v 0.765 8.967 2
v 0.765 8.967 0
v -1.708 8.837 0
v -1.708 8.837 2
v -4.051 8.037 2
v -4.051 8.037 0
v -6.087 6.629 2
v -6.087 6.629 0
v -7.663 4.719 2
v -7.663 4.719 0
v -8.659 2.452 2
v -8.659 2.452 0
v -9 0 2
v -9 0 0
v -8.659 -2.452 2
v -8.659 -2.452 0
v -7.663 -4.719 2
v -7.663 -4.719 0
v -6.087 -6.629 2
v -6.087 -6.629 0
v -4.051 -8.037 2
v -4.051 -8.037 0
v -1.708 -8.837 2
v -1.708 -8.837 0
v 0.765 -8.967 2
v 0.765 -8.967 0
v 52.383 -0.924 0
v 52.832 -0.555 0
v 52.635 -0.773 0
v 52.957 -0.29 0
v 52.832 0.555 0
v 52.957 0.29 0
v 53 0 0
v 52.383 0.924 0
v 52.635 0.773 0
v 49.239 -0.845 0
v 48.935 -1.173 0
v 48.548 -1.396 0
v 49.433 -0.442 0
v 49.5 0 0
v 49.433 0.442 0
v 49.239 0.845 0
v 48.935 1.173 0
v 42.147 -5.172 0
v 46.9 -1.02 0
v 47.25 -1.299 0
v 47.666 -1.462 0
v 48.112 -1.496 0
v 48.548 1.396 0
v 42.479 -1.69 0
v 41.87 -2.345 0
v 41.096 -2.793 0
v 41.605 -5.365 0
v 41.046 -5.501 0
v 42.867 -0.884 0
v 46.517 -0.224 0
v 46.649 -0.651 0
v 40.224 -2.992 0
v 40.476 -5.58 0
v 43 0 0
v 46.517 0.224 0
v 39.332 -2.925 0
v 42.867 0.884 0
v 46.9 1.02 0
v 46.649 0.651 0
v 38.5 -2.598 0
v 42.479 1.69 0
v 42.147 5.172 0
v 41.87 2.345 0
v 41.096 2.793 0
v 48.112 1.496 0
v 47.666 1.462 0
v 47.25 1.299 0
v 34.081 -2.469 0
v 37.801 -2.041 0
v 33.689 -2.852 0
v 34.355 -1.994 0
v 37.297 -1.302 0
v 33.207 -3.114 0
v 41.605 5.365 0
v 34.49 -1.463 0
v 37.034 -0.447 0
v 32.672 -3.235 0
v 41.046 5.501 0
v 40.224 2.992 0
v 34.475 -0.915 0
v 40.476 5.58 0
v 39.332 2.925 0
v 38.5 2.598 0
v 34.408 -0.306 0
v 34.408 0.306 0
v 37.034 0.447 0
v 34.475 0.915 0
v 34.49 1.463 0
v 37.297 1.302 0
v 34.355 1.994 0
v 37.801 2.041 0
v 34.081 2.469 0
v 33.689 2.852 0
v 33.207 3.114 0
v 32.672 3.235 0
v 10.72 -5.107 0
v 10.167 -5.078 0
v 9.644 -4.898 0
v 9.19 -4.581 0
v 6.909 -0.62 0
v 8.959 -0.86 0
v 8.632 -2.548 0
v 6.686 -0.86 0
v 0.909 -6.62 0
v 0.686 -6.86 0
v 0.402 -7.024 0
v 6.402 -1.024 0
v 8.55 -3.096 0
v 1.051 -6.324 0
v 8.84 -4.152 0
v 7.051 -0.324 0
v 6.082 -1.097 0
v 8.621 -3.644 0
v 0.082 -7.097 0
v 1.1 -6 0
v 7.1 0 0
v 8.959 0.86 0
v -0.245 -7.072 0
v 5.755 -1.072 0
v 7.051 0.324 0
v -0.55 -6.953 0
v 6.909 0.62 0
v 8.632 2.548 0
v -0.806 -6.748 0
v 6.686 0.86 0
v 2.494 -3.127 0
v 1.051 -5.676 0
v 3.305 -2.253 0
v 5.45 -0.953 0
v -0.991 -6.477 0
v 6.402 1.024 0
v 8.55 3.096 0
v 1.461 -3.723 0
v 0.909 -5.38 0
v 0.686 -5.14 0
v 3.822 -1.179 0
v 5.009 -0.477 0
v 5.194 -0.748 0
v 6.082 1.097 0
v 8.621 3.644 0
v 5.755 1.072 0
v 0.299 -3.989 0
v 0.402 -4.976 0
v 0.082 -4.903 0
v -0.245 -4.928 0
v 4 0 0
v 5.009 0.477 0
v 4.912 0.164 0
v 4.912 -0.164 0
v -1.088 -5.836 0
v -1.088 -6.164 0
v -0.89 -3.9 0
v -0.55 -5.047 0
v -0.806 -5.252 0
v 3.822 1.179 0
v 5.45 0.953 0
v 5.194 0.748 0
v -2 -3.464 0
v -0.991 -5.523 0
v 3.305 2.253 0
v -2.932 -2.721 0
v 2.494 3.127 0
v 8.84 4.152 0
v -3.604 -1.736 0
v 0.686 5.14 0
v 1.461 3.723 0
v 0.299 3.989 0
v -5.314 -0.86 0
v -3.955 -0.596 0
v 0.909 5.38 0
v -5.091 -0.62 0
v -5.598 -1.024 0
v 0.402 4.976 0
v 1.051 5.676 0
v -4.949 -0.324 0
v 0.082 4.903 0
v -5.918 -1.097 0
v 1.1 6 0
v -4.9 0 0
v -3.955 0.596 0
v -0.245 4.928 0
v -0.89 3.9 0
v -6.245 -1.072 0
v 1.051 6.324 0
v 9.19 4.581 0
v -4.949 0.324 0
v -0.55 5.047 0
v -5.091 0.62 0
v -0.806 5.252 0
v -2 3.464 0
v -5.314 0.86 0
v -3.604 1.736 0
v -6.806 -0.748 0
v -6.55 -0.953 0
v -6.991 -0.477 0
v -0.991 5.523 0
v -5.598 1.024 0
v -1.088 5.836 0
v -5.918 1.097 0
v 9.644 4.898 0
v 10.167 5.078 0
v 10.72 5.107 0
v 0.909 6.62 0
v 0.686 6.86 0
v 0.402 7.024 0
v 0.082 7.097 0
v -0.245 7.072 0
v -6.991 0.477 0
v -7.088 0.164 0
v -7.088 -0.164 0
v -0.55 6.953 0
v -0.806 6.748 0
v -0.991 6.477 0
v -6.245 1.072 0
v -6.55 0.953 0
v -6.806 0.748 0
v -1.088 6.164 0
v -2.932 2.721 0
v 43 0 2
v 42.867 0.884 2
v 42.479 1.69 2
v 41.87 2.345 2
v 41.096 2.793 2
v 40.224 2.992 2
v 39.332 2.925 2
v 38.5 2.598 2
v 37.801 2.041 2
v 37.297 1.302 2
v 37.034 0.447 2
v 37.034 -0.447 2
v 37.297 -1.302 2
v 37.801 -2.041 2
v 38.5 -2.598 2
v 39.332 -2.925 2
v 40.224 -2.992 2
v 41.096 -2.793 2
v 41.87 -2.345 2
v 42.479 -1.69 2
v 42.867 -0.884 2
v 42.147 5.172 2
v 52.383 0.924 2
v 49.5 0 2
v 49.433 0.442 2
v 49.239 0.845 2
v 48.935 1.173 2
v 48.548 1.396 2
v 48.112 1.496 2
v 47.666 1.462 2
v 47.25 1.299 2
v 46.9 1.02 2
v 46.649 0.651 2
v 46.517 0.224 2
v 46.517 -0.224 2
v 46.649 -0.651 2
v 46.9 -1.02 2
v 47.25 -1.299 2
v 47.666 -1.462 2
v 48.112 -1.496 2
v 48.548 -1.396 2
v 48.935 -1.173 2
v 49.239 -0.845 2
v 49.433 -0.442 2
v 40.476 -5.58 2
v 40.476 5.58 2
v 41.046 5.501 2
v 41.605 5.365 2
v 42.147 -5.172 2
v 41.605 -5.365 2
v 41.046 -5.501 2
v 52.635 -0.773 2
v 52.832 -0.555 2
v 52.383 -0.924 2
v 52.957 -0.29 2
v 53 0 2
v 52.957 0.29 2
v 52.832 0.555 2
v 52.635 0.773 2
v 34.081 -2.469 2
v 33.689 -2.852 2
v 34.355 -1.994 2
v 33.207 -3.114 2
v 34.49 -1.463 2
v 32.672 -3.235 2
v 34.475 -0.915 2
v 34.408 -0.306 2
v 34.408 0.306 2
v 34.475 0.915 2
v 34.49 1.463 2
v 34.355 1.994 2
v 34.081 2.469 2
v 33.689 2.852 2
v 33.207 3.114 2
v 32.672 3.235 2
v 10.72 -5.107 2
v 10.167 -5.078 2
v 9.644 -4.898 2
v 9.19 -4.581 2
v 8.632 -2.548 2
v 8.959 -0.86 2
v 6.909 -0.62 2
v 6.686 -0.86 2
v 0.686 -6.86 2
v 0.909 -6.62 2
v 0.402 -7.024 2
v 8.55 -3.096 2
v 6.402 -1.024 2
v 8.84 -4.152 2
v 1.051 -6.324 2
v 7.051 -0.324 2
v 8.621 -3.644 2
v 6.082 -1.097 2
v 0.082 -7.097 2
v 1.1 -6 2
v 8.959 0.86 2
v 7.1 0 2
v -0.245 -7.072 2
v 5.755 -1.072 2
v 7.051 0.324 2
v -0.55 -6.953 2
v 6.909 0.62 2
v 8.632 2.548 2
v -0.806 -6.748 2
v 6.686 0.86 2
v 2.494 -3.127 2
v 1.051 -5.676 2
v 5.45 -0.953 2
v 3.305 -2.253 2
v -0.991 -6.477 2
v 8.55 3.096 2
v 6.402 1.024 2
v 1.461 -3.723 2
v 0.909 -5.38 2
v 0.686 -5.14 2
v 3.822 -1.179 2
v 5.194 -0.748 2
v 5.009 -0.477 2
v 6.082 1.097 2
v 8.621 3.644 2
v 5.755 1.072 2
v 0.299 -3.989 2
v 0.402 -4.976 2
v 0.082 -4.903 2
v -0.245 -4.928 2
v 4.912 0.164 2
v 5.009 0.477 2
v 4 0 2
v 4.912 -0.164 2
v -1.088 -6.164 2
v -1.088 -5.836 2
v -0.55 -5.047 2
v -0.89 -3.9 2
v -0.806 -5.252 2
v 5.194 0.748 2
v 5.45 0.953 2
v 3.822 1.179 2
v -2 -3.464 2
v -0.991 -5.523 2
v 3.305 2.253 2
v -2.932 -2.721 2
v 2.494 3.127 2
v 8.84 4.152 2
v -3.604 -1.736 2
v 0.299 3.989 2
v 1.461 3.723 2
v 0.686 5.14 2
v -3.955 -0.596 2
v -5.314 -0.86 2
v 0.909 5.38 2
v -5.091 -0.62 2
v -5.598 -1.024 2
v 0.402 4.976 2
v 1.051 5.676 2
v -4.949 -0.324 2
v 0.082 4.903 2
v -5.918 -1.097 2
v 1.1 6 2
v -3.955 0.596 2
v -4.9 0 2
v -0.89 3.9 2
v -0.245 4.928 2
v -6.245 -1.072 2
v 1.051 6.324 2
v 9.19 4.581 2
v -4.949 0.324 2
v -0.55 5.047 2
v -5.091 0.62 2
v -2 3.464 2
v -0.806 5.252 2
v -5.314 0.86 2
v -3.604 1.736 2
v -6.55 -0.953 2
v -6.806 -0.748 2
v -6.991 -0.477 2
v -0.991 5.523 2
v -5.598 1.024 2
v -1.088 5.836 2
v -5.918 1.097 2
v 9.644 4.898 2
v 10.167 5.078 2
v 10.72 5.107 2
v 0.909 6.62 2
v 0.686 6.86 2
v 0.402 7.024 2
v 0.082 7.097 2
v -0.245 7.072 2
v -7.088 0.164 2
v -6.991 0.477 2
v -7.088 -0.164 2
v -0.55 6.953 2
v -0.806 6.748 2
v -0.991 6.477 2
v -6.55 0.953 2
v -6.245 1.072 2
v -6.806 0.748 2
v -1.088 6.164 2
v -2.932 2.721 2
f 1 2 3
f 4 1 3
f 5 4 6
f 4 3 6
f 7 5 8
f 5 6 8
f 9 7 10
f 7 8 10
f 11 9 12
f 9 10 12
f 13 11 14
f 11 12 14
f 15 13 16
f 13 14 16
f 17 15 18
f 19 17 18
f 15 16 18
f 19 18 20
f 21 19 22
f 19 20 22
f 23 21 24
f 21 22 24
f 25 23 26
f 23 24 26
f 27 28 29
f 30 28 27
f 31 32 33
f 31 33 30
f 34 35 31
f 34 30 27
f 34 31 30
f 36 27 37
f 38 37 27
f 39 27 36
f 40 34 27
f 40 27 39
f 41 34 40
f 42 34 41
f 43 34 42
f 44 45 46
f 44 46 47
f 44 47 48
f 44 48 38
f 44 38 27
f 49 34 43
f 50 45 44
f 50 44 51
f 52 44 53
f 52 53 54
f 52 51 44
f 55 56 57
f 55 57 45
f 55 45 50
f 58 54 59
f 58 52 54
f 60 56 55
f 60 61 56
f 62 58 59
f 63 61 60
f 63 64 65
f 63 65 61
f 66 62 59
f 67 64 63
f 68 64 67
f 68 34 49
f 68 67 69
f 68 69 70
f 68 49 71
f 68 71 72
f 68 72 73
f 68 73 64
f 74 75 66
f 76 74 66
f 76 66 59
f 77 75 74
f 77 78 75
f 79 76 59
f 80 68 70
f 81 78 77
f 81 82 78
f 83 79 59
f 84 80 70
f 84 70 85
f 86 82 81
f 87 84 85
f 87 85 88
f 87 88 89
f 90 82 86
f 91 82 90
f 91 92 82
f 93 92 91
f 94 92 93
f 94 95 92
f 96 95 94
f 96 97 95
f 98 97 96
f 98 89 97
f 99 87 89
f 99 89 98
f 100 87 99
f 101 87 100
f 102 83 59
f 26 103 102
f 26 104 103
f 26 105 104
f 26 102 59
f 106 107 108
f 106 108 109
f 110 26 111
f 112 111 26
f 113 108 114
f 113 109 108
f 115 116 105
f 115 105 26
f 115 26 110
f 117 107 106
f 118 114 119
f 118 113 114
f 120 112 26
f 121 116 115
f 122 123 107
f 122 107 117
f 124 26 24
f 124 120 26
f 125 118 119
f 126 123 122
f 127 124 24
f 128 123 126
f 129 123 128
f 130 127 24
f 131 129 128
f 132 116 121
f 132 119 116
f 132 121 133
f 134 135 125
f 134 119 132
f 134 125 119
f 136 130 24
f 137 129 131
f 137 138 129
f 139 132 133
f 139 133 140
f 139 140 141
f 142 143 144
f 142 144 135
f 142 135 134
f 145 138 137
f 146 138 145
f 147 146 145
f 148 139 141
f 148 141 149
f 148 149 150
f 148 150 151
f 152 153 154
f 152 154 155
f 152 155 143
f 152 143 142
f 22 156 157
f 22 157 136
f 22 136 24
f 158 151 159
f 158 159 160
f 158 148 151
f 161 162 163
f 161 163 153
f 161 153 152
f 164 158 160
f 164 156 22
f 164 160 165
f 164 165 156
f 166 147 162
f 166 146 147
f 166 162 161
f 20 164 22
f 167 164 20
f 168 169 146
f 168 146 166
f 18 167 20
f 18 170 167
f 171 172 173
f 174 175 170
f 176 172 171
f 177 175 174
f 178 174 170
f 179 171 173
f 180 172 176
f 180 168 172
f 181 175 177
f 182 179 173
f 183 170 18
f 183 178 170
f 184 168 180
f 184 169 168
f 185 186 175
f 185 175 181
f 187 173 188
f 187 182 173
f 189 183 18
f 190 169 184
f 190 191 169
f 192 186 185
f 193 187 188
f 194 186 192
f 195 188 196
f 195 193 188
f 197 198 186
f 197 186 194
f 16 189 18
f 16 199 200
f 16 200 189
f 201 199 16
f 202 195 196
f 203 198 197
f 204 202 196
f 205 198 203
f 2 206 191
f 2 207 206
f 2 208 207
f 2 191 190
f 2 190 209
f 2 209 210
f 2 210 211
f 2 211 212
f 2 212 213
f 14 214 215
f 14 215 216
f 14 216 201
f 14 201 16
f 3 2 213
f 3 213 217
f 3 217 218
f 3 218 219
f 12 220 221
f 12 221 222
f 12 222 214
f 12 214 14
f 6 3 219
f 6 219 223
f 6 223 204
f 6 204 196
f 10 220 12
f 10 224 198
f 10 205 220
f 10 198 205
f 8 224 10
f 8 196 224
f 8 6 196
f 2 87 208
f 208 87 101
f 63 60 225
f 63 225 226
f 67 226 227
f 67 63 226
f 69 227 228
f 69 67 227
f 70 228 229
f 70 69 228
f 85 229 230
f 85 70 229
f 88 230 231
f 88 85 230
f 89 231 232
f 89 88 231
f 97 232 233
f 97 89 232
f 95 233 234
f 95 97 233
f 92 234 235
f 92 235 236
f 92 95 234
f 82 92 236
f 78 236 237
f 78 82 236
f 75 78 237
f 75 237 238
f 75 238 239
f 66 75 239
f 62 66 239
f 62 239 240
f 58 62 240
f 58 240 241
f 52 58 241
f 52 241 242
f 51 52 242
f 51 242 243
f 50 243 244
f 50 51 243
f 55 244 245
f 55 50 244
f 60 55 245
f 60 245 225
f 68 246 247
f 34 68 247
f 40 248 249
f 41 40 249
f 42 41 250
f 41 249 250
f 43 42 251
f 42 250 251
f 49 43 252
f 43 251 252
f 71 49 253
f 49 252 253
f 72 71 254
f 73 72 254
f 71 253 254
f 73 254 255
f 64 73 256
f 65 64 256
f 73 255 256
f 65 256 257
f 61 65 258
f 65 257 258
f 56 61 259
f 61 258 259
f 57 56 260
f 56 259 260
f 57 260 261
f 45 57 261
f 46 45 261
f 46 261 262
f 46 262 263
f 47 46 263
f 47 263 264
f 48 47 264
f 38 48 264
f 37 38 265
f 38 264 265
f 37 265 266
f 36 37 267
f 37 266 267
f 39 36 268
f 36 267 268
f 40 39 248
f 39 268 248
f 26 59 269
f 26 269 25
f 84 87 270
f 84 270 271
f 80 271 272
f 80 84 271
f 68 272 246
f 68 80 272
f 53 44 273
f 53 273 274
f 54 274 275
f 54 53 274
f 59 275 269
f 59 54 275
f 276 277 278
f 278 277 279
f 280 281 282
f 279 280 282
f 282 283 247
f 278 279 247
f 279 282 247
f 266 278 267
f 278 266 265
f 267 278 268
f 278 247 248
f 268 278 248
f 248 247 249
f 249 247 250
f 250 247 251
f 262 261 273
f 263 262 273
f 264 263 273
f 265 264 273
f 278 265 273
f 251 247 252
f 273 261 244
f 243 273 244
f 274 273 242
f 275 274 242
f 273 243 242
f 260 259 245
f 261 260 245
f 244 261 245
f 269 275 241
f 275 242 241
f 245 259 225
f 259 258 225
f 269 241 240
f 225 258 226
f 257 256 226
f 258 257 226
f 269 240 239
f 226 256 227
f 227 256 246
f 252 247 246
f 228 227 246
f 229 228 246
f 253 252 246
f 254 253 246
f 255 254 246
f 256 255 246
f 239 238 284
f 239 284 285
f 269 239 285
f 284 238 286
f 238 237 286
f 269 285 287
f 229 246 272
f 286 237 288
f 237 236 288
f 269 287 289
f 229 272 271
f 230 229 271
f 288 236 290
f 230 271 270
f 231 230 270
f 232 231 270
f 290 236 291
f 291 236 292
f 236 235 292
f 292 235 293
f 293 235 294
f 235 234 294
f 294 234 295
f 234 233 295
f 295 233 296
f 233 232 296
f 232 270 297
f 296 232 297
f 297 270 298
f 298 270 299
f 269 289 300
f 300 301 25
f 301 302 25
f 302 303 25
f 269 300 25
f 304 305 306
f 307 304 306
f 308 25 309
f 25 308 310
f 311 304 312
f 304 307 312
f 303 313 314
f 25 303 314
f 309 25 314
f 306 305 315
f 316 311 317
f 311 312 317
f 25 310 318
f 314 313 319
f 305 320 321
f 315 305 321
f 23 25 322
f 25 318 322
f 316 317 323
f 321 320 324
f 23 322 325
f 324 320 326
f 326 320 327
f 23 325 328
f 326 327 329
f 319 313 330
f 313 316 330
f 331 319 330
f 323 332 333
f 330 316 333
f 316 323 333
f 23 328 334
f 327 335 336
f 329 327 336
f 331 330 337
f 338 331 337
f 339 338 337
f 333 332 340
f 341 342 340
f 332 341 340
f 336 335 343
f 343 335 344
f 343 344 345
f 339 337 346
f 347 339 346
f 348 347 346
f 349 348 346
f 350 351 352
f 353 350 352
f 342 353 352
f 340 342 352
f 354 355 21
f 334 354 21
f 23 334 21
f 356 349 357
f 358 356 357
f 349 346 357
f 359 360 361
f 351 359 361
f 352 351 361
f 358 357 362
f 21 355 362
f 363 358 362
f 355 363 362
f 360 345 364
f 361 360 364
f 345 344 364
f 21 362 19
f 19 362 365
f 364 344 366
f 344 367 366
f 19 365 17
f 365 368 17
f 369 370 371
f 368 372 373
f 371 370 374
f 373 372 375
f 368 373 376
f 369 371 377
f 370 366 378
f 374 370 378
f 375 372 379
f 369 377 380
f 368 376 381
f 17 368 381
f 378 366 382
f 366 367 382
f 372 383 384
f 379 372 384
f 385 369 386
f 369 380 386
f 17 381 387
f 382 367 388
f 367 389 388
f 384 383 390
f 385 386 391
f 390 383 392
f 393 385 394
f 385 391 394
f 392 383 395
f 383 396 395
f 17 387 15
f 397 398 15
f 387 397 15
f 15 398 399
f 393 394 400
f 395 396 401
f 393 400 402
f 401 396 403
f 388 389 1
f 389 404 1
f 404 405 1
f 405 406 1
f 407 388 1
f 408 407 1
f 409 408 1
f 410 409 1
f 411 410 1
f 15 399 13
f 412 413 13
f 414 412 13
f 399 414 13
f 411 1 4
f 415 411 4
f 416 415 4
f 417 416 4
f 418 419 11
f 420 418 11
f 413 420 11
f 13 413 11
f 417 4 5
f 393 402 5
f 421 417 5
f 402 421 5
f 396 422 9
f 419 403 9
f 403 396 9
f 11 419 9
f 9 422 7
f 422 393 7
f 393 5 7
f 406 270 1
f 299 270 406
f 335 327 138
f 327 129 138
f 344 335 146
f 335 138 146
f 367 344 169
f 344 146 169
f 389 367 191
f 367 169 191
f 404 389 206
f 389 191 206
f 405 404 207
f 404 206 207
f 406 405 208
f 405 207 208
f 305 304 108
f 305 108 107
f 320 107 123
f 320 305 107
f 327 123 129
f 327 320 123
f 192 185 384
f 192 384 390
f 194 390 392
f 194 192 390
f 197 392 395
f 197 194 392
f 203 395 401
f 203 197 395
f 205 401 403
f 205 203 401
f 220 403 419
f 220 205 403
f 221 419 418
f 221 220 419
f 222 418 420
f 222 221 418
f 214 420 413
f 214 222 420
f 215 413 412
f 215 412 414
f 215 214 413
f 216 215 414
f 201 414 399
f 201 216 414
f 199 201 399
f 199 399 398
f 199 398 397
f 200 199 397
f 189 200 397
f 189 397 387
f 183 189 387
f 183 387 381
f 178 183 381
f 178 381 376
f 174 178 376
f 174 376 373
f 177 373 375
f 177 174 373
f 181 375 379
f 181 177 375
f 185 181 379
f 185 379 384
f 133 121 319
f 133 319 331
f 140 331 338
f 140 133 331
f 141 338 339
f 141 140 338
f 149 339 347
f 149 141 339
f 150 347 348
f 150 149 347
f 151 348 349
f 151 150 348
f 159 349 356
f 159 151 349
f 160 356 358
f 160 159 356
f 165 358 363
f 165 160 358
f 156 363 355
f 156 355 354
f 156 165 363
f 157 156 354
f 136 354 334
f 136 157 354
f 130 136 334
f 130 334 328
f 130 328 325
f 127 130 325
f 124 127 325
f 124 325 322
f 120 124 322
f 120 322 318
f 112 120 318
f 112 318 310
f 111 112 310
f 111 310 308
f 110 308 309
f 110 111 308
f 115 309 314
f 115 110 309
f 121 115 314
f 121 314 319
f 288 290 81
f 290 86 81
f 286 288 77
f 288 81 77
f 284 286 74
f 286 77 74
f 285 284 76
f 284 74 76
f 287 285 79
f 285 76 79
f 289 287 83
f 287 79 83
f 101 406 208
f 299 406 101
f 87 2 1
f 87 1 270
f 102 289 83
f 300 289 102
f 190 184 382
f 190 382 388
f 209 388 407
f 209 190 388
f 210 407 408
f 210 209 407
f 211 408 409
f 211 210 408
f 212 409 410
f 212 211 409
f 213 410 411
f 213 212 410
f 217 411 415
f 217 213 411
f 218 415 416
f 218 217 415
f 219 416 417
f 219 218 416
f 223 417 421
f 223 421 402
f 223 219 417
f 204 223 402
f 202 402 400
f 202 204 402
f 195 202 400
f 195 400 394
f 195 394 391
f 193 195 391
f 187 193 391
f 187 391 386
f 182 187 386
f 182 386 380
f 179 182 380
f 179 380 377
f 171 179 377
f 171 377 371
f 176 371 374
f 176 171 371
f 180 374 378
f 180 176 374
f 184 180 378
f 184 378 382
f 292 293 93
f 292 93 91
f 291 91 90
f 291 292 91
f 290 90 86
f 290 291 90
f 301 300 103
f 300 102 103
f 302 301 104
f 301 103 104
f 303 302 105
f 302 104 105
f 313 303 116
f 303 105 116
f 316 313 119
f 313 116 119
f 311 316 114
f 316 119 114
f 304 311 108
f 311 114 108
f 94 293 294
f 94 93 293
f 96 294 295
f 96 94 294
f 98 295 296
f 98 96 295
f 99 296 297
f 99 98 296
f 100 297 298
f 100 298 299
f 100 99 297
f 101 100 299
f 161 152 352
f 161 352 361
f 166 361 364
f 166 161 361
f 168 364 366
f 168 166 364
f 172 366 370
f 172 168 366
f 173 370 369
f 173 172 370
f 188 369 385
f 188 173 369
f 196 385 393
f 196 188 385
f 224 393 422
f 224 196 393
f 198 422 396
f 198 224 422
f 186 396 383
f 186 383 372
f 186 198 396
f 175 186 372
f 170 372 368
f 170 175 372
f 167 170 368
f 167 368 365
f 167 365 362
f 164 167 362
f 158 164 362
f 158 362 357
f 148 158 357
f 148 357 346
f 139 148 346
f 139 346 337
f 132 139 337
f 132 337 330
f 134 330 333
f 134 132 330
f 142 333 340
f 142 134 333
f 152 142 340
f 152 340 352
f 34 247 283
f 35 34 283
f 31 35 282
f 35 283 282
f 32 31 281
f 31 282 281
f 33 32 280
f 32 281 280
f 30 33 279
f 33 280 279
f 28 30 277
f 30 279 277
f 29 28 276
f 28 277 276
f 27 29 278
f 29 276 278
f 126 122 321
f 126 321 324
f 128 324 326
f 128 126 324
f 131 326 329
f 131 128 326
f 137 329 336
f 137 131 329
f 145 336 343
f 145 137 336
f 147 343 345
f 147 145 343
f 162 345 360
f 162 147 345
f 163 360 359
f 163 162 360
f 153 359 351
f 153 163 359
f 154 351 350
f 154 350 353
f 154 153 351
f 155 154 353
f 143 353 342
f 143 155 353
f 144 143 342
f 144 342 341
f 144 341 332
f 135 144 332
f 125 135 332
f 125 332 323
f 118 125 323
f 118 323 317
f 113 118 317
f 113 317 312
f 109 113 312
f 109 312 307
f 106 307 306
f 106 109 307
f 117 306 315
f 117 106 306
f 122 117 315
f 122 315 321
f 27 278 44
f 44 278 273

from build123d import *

# Parameters (mm, degrees)
ESQUISSE1_R             = 9
ESQUISSE1_R_2           = 1.1
ESQUISSE1_R_3           = 4
BOSS_EXTRU_1_DEPTH      = 2
BOSS_EXTRU_2_START      = -2
ESQUISSE2_R             = 3
BOSS_EXTRU_2_DEPTH      = 2
ENL_V_MAT_EXTRU_1_DEPTH = 47.52268264
CONG_1_R                = 2
ESQUISSE4_R             = 1.5
BOSS_EXTRU_3_DEPTH      = 2


with BuildPart() as part:
    # Esquisse1 → Boss.-Extru.1 (new body)
    with BuildSketch(Plane.XY):
        Circle(ESQUISSE1_R)
        with Locations((0, 6)):
            Circle(ESQUISSE1_R_2, mode=Mode.SUBTRACT)
        with Locations((6, 0)):
            Circle(ESQUISSE1_R_2, mode=Mode.SUBTRACT)
        with Locations((0, -6)):
            Circle(ESQUISSE1_R_2, mode=Mode.SUBTRACT)
        with Locations((-6, 0)):
            Circle(ESQUISSE1_R_2, mode=Mode.SUBTRACT)
        Circle(ESQUISSE1_R_3, mode=Mode.SUBTRACT)
    extrude(amount=BOSS_EXTRU_1_DEPTH)

    # Esquisse2 → Boss.-Extru.2 (add)
    with BuildSketch(Plane.XY.offset(2).offset(BOSS_EXTRU_2_START)):
        with BuildLine():
            Line((0.765, 8.967428561), (40.476, 5.579733327))
            ThreePointArc((40.476, 5.579733327), (45.6, 0), (40.476, -5.579733327))
            Line((40.476, -5.579733327), (0.765, -8.967428561))
            ThreePointArc((0.765, -8.967428561), (9, 0), (0.765, 8.967428561))
        make_face()
        with Locations((40, 0)):
            Circle(ESQUISSE2_R, mode=Mode.SUBTRACT)
    extrude(amount=BOSS_EXTRU_2_DEPTH)

    # Esquisse3 → Enlèv. mat.-Extru.1 (cut, through all)
    with BuildSketch(Plane.XY.offset(2)):
        with BuildLine():
            Line((7.193926615, 5.408088373), (35.279111191, 3.012176763))
            ThreePointArc((35.279111191, 3.012176763), (34.4, 0), (35.279111191, -3.012176763))
            Line((35.279111191, -3.012176763), (7.193926615, -5.408088373))
            ThreePointArc((7.193926615, -5.408088373), (9, 0), (7.193926615, 5.408088373))
        make_face()
    extrude(amount=-ENL_V_MAT_EXTRU_1_DEPTH, mode=Mode.SUBTRACT)

    # Congé1
    cong_1_edges = [part.edges().sort_by_distance(p)[0] for p in [
        (7.193926615, -5.408088373, 1),
        (7.193926615, 5.408088373, 1),
        (35.279111191, 3.012176763, 1),
        (35.279111191, -3.012176763, 1),
    ]]
    fillet(cong_1_edges, radius=CONG_1_R)

    # Esquisse4 → Boss.-Extru.3 (add)
    with BuildSketch(Plane.XY.offset(2)):
        with BuildLine():
            Line((42.146666667, 5.172216374), (52.383333333, 0.923610067))
            ThreePointArc((52.383333333, 0.923610067), (53, 0), (52.383333333, -0.923610067))
            Line((52.383333333, -0.923610067), (42.146666667, -5.172216374))
            ThreePointArc((42.146666667, -5.172216374), (45.6, 0), (42.146666667, 5.172216374))
        make_face()
        with Locations((48, 0)):
            Circle(ESQUISSE4_R, mode=Mode.SUBTRACT)
    extrude(amount=-BOSS_EXTRU_3_DEPTH)


solid = part.part
